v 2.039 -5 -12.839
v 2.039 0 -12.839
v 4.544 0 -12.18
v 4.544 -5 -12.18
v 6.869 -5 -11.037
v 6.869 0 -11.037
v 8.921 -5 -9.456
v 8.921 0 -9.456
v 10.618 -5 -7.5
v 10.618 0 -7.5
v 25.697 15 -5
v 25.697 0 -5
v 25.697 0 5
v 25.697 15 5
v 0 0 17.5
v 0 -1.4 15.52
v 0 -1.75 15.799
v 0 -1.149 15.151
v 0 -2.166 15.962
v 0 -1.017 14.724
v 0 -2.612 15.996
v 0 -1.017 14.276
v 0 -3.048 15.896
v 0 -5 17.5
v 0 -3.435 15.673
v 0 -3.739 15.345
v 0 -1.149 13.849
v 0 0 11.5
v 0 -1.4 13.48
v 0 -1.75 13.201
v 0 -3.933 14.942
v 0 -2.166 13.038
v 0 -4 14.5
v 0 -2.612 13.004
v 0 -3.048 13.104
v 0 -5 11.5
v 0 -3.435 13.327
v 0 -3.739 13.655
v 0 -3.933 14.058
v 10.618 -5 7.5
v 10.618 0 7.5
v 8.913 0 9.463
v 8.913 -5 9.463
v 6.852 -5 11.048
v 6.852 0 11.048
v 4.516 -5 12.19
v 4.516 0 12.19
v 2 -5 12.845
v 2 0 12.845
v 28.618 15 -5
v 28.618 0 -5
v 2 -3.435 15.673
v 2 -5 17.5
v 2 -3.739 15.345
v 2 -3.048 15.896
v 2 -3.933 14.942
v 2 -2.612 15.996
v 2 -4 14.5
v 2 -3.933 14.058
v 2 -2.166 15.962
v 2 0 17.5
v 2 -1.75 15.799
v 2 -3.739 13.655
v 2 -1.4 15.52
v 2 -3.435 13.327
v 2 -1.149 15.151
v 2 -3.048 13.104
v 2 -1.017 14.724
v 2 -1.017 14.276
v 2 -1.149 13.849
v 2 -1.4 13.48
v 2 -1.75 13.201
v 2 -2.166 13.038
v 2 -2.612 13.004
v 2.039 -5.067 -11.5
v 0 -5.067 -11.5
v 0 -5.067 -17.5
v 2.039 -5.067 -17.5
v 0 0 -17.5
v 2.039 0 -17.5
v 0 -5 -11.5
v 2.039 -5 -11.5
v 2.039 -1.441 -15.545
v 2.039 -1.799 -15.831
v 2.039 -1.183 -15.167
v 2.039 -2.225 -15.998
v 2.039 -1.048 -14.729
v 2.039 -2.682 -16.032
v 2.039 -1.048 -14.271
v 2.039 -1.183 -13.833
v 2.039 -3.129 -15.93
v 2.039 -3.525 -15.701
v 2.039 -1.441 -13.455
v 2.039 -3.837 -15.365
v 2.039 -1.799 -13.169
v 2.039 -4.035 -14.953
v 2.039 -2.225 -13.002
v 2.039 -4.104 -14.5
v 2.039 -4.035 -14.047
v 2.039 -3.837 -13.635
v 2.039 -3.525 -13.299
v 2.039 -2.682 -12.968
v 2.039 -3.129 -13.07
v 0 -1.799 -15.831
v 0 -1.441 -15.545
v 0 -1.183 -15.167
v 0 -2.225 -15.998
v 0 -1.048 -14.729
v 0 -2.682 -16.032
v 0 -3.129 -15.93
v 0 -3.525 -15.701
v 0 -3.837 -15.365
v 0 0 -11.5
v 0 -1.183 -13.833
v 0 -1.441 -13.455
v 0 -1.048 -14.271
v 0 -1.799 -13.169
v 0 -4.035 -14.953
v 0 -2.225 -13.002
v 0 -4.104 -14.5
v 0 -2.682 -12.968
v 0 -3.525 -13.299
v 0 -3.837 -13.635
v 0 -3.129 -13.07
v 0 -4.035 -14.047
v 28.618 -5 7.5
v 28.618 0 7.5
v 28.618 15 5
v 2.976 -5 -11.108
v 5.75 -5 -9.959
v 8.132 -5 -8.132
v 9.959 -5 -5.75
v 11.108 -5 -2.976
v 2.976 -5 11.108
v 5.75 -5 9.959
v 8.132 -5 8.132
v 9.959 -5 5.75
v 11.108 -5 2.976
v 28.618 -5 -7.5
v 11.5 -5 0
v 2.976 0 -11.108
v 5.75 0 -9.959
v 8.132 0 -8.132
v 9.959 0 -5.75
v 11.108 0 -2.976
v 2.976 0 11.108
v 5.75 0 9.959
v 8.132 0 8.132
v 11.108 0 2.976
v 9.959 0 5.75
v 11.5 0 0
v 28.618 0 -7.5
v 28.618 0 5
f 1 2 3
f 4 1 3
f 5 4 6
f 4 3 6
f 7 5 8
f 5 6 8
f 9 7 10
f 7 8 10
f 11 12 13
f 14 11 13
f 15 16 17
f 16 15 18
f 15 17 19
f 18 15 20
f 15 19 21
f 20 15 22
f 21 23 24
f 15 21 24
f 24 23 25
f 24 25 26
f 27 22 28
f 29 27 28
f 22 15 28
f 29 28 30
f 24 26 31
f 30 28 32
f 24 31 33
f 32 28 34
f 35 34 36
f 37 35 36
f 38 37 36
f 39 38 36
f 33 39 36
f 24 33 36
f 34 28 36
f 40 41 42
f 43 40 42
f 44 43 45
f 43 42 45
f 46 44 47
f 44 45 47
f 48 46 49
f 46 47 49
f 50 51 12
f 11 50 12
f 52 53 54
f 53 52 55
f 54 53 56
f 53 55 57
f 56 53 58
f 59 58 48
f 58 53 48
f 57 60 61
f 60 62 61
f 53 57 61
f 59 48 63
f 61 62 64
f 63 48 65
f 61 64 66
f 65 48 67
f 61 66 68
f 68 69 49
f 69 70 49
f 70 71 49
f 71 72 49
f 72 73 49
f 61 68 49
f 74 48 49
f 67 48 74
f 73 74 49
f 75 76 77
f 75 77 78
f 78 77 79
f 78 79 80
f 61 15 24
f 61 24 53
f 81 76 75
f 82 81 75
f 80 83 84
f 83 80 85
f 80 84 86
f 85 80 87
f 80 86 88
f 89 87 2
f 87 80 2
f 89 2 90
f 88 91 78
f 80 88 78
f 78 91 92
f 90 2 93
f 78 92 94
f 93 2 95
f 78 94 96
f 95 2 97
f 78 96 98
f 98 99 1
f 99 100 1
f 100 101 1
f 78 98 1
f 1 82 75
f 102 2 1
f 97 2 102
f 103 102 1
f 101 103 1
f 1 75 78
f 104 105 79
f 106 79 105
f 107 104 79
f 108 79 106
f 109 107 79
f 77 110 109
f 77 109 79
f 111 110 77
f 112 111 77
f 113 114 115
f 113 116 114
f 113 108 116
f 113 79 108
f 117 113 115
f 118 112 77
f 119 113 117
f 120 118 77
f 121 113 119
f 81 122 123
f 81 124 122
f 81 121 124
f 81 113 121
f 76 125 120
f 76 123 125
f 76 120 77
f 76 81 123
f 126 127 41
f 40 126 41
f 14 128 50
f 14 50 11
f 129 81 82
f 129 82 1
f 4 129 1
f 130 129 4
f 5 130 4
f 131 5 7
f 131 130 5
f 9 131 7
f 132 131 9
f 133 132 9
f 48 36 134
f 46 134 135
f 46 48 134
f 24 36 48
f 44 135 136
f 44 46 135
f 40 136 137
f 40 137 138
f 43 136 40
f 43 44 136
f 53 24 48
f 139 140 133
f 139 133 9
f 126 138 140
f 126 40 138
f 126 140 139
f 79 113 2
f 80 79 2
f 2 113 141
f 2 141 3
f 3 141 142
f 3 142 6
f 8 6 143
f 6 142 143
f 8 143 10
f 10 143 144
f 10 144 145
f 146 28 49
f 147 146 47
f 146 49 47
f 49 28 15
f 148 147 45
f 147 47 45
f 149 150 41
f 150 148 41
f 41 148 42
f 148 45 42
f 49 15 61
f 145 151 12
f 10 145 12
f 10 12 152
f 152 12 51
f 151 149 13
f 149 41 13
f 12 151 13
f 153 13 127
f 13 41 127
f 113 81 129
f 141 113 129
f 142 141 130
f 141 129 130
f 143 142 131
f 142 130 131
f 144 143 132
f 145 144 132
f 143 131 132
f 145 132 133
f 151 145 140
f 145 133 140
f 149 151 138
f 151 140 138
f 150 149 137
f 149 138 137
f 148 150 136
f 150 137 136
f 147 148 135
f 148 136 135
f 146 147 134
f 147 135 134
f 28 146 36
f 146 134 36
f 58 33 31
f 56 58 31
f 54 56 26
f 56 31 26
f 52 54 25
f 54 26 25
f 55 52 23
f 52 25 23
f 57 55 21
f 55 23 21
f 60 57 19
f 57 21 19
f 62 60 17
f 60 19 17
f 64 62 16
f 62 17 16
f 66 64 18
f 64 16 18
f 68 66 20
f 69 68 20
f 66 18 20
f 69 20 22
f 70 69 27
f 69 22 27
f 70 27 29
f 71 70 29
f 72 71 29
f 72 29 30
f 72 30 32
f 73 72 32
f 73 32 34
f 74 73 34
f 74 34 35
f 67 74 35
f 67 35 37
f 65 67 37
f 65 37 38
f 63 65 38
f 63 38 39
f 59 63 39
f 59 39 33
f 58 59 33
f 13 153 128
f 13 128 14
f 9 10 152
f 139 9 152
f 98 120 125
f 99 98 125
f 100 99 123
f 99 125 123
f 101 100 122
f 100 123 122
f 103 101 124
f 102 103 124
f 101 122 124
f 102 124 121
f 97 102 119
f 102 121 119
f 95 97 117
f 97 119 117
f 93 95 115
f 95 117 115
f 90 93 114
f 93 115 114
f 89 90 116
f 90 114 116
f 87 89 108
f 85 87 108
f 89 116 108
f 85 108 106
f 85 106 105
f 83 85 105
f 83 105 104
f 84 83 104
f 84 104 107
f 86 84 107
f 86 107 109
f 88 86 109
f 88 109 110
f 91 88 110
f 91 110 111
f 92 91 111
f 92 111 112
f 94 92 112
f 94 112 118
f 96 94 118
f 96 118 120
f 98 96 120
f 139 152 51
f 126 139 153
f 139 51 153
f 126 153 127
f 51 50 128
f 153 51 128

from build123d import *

# Parameters (mm, degrees)
F1_DEPTH      = 5
F2_R          = 11.5
F3_DEPTH      = 25
F4_W          = 19.7234917432
F4_H          = 22.7468013763
F5_DEPTH      = 20.501
F5_DEPTH_BACK = 50
F7_START      = 4
F6_W          = 2.0386253018
F6_H          = 5.0671915524
F7_DEPTH      = 6
F8_R          = 1.5364131309
F9_DEPTH      = 25
F10_W         = 2.9216879989
F10_H         = 10
F11_DEPTH     = 15
F13_START     = 4
F12_W         = 2
F12_H         = 5
F13_DEPTH     = 6
F14_R         = 1.5
F15_DEPTH     = 25


with BuildPart() as f1:
    # F0 (on Front) → F1 (new body)
    with BuildSketch(Plane.XZ):
        with BuildLine():
            Line((10.6183802908, -7.5), (28.6183802908, -7.5))
            Line((28.6183802908, -7.5), (28.6183802908, 7.5))
            Line((28.6183802908, 7.5), (10.6183802908, 7.5))
            ThreePointArc((10.6183802908, 7.5), (-13, 0), (10.6183802908, -7.5))
        make_face()
    extrude(amount=F1_DEPTH)

    # F2 (on face) → F3 (cut)
    with BuildSketch(Plane.XZ.offset(5)):
        Circle(F2_R)
    extrude(amount=-F3_DEPTH, mode=Mode.SUBTRACT)

    # F4 (on face) → F5 (cut, two sides)
    with BuildSketch(Plane(origin=(0, 0, -7.5), x_dir=(1, 0, 0), z_dir=(0, 0, -1))) as f5_sk:
        with Locations((-9.8617458716, 1.8715718761)):
            Rectangle(F4_W, F4_H)
    extrude(amount=-F5_DEPTH, mode=Mode.SUBTRACT)
    extrude(f5_sk.sketch, amount=F5_DEPTH_BACK, mode=Mode.SUBTRACT)

    # F6 (on face) → F7 (join)
    with BuildSketch(Plane(origin=(0, 0, -7.5), x_dir=(1, 0, 0), z_dir=(0, 0, -1)).offset(F7_START)):
        with Locations((1.0193126509, 2.5335957762)):
            Rectangle(F6_W, F6_H)
    extrude(amount=F7_DEPTH)

    # F8 (on face) → F9 (cut)
    with BuildSketch(Plane(origin=(0, 0, 0), x_dir=(0, -1, 0), z_dir=(-1, 0, 0))):
        with Locations((2.5671915524, -14.5)):
            Circle(F8_R)
    extrude(amount=-F9_DEPTH, mode=Mode.SUBTRACT)

    # F10 (on face) → F11 (join)
    with BuildSketch(Plane(origin=(0, 0, 0), x_dir=(-1, 0, 0), z_dir=(0, 1, 0))):
        with Locations((-27.1575362913, 0)):
            Rectangle(F10_W, F10_H)
    extrude(amount=F11_DEPTH)

    # F12 (on face) → F13 (join)
    with BuildSketch(Plane.XY.offset(7.5).offset(F13_START)):
        with Locations((1, -2.5)):
            Rectangle(F12_W, F12_H)
    extrude(amount=F13_DEPTH)

    # F14 (on face) → F15 (cut)
    with BuildSketch(Plane(origin=(0, 0, 0), x_dir=(0, -1, 0), z_dir=(-1, 0, 0))):
        with Locations((2.5, 14.5)):
            Circle(F14_R)
    extrude(amount=-F15_DEPTH, mode=Mode.SUBTRACT)


solid = f1.part
